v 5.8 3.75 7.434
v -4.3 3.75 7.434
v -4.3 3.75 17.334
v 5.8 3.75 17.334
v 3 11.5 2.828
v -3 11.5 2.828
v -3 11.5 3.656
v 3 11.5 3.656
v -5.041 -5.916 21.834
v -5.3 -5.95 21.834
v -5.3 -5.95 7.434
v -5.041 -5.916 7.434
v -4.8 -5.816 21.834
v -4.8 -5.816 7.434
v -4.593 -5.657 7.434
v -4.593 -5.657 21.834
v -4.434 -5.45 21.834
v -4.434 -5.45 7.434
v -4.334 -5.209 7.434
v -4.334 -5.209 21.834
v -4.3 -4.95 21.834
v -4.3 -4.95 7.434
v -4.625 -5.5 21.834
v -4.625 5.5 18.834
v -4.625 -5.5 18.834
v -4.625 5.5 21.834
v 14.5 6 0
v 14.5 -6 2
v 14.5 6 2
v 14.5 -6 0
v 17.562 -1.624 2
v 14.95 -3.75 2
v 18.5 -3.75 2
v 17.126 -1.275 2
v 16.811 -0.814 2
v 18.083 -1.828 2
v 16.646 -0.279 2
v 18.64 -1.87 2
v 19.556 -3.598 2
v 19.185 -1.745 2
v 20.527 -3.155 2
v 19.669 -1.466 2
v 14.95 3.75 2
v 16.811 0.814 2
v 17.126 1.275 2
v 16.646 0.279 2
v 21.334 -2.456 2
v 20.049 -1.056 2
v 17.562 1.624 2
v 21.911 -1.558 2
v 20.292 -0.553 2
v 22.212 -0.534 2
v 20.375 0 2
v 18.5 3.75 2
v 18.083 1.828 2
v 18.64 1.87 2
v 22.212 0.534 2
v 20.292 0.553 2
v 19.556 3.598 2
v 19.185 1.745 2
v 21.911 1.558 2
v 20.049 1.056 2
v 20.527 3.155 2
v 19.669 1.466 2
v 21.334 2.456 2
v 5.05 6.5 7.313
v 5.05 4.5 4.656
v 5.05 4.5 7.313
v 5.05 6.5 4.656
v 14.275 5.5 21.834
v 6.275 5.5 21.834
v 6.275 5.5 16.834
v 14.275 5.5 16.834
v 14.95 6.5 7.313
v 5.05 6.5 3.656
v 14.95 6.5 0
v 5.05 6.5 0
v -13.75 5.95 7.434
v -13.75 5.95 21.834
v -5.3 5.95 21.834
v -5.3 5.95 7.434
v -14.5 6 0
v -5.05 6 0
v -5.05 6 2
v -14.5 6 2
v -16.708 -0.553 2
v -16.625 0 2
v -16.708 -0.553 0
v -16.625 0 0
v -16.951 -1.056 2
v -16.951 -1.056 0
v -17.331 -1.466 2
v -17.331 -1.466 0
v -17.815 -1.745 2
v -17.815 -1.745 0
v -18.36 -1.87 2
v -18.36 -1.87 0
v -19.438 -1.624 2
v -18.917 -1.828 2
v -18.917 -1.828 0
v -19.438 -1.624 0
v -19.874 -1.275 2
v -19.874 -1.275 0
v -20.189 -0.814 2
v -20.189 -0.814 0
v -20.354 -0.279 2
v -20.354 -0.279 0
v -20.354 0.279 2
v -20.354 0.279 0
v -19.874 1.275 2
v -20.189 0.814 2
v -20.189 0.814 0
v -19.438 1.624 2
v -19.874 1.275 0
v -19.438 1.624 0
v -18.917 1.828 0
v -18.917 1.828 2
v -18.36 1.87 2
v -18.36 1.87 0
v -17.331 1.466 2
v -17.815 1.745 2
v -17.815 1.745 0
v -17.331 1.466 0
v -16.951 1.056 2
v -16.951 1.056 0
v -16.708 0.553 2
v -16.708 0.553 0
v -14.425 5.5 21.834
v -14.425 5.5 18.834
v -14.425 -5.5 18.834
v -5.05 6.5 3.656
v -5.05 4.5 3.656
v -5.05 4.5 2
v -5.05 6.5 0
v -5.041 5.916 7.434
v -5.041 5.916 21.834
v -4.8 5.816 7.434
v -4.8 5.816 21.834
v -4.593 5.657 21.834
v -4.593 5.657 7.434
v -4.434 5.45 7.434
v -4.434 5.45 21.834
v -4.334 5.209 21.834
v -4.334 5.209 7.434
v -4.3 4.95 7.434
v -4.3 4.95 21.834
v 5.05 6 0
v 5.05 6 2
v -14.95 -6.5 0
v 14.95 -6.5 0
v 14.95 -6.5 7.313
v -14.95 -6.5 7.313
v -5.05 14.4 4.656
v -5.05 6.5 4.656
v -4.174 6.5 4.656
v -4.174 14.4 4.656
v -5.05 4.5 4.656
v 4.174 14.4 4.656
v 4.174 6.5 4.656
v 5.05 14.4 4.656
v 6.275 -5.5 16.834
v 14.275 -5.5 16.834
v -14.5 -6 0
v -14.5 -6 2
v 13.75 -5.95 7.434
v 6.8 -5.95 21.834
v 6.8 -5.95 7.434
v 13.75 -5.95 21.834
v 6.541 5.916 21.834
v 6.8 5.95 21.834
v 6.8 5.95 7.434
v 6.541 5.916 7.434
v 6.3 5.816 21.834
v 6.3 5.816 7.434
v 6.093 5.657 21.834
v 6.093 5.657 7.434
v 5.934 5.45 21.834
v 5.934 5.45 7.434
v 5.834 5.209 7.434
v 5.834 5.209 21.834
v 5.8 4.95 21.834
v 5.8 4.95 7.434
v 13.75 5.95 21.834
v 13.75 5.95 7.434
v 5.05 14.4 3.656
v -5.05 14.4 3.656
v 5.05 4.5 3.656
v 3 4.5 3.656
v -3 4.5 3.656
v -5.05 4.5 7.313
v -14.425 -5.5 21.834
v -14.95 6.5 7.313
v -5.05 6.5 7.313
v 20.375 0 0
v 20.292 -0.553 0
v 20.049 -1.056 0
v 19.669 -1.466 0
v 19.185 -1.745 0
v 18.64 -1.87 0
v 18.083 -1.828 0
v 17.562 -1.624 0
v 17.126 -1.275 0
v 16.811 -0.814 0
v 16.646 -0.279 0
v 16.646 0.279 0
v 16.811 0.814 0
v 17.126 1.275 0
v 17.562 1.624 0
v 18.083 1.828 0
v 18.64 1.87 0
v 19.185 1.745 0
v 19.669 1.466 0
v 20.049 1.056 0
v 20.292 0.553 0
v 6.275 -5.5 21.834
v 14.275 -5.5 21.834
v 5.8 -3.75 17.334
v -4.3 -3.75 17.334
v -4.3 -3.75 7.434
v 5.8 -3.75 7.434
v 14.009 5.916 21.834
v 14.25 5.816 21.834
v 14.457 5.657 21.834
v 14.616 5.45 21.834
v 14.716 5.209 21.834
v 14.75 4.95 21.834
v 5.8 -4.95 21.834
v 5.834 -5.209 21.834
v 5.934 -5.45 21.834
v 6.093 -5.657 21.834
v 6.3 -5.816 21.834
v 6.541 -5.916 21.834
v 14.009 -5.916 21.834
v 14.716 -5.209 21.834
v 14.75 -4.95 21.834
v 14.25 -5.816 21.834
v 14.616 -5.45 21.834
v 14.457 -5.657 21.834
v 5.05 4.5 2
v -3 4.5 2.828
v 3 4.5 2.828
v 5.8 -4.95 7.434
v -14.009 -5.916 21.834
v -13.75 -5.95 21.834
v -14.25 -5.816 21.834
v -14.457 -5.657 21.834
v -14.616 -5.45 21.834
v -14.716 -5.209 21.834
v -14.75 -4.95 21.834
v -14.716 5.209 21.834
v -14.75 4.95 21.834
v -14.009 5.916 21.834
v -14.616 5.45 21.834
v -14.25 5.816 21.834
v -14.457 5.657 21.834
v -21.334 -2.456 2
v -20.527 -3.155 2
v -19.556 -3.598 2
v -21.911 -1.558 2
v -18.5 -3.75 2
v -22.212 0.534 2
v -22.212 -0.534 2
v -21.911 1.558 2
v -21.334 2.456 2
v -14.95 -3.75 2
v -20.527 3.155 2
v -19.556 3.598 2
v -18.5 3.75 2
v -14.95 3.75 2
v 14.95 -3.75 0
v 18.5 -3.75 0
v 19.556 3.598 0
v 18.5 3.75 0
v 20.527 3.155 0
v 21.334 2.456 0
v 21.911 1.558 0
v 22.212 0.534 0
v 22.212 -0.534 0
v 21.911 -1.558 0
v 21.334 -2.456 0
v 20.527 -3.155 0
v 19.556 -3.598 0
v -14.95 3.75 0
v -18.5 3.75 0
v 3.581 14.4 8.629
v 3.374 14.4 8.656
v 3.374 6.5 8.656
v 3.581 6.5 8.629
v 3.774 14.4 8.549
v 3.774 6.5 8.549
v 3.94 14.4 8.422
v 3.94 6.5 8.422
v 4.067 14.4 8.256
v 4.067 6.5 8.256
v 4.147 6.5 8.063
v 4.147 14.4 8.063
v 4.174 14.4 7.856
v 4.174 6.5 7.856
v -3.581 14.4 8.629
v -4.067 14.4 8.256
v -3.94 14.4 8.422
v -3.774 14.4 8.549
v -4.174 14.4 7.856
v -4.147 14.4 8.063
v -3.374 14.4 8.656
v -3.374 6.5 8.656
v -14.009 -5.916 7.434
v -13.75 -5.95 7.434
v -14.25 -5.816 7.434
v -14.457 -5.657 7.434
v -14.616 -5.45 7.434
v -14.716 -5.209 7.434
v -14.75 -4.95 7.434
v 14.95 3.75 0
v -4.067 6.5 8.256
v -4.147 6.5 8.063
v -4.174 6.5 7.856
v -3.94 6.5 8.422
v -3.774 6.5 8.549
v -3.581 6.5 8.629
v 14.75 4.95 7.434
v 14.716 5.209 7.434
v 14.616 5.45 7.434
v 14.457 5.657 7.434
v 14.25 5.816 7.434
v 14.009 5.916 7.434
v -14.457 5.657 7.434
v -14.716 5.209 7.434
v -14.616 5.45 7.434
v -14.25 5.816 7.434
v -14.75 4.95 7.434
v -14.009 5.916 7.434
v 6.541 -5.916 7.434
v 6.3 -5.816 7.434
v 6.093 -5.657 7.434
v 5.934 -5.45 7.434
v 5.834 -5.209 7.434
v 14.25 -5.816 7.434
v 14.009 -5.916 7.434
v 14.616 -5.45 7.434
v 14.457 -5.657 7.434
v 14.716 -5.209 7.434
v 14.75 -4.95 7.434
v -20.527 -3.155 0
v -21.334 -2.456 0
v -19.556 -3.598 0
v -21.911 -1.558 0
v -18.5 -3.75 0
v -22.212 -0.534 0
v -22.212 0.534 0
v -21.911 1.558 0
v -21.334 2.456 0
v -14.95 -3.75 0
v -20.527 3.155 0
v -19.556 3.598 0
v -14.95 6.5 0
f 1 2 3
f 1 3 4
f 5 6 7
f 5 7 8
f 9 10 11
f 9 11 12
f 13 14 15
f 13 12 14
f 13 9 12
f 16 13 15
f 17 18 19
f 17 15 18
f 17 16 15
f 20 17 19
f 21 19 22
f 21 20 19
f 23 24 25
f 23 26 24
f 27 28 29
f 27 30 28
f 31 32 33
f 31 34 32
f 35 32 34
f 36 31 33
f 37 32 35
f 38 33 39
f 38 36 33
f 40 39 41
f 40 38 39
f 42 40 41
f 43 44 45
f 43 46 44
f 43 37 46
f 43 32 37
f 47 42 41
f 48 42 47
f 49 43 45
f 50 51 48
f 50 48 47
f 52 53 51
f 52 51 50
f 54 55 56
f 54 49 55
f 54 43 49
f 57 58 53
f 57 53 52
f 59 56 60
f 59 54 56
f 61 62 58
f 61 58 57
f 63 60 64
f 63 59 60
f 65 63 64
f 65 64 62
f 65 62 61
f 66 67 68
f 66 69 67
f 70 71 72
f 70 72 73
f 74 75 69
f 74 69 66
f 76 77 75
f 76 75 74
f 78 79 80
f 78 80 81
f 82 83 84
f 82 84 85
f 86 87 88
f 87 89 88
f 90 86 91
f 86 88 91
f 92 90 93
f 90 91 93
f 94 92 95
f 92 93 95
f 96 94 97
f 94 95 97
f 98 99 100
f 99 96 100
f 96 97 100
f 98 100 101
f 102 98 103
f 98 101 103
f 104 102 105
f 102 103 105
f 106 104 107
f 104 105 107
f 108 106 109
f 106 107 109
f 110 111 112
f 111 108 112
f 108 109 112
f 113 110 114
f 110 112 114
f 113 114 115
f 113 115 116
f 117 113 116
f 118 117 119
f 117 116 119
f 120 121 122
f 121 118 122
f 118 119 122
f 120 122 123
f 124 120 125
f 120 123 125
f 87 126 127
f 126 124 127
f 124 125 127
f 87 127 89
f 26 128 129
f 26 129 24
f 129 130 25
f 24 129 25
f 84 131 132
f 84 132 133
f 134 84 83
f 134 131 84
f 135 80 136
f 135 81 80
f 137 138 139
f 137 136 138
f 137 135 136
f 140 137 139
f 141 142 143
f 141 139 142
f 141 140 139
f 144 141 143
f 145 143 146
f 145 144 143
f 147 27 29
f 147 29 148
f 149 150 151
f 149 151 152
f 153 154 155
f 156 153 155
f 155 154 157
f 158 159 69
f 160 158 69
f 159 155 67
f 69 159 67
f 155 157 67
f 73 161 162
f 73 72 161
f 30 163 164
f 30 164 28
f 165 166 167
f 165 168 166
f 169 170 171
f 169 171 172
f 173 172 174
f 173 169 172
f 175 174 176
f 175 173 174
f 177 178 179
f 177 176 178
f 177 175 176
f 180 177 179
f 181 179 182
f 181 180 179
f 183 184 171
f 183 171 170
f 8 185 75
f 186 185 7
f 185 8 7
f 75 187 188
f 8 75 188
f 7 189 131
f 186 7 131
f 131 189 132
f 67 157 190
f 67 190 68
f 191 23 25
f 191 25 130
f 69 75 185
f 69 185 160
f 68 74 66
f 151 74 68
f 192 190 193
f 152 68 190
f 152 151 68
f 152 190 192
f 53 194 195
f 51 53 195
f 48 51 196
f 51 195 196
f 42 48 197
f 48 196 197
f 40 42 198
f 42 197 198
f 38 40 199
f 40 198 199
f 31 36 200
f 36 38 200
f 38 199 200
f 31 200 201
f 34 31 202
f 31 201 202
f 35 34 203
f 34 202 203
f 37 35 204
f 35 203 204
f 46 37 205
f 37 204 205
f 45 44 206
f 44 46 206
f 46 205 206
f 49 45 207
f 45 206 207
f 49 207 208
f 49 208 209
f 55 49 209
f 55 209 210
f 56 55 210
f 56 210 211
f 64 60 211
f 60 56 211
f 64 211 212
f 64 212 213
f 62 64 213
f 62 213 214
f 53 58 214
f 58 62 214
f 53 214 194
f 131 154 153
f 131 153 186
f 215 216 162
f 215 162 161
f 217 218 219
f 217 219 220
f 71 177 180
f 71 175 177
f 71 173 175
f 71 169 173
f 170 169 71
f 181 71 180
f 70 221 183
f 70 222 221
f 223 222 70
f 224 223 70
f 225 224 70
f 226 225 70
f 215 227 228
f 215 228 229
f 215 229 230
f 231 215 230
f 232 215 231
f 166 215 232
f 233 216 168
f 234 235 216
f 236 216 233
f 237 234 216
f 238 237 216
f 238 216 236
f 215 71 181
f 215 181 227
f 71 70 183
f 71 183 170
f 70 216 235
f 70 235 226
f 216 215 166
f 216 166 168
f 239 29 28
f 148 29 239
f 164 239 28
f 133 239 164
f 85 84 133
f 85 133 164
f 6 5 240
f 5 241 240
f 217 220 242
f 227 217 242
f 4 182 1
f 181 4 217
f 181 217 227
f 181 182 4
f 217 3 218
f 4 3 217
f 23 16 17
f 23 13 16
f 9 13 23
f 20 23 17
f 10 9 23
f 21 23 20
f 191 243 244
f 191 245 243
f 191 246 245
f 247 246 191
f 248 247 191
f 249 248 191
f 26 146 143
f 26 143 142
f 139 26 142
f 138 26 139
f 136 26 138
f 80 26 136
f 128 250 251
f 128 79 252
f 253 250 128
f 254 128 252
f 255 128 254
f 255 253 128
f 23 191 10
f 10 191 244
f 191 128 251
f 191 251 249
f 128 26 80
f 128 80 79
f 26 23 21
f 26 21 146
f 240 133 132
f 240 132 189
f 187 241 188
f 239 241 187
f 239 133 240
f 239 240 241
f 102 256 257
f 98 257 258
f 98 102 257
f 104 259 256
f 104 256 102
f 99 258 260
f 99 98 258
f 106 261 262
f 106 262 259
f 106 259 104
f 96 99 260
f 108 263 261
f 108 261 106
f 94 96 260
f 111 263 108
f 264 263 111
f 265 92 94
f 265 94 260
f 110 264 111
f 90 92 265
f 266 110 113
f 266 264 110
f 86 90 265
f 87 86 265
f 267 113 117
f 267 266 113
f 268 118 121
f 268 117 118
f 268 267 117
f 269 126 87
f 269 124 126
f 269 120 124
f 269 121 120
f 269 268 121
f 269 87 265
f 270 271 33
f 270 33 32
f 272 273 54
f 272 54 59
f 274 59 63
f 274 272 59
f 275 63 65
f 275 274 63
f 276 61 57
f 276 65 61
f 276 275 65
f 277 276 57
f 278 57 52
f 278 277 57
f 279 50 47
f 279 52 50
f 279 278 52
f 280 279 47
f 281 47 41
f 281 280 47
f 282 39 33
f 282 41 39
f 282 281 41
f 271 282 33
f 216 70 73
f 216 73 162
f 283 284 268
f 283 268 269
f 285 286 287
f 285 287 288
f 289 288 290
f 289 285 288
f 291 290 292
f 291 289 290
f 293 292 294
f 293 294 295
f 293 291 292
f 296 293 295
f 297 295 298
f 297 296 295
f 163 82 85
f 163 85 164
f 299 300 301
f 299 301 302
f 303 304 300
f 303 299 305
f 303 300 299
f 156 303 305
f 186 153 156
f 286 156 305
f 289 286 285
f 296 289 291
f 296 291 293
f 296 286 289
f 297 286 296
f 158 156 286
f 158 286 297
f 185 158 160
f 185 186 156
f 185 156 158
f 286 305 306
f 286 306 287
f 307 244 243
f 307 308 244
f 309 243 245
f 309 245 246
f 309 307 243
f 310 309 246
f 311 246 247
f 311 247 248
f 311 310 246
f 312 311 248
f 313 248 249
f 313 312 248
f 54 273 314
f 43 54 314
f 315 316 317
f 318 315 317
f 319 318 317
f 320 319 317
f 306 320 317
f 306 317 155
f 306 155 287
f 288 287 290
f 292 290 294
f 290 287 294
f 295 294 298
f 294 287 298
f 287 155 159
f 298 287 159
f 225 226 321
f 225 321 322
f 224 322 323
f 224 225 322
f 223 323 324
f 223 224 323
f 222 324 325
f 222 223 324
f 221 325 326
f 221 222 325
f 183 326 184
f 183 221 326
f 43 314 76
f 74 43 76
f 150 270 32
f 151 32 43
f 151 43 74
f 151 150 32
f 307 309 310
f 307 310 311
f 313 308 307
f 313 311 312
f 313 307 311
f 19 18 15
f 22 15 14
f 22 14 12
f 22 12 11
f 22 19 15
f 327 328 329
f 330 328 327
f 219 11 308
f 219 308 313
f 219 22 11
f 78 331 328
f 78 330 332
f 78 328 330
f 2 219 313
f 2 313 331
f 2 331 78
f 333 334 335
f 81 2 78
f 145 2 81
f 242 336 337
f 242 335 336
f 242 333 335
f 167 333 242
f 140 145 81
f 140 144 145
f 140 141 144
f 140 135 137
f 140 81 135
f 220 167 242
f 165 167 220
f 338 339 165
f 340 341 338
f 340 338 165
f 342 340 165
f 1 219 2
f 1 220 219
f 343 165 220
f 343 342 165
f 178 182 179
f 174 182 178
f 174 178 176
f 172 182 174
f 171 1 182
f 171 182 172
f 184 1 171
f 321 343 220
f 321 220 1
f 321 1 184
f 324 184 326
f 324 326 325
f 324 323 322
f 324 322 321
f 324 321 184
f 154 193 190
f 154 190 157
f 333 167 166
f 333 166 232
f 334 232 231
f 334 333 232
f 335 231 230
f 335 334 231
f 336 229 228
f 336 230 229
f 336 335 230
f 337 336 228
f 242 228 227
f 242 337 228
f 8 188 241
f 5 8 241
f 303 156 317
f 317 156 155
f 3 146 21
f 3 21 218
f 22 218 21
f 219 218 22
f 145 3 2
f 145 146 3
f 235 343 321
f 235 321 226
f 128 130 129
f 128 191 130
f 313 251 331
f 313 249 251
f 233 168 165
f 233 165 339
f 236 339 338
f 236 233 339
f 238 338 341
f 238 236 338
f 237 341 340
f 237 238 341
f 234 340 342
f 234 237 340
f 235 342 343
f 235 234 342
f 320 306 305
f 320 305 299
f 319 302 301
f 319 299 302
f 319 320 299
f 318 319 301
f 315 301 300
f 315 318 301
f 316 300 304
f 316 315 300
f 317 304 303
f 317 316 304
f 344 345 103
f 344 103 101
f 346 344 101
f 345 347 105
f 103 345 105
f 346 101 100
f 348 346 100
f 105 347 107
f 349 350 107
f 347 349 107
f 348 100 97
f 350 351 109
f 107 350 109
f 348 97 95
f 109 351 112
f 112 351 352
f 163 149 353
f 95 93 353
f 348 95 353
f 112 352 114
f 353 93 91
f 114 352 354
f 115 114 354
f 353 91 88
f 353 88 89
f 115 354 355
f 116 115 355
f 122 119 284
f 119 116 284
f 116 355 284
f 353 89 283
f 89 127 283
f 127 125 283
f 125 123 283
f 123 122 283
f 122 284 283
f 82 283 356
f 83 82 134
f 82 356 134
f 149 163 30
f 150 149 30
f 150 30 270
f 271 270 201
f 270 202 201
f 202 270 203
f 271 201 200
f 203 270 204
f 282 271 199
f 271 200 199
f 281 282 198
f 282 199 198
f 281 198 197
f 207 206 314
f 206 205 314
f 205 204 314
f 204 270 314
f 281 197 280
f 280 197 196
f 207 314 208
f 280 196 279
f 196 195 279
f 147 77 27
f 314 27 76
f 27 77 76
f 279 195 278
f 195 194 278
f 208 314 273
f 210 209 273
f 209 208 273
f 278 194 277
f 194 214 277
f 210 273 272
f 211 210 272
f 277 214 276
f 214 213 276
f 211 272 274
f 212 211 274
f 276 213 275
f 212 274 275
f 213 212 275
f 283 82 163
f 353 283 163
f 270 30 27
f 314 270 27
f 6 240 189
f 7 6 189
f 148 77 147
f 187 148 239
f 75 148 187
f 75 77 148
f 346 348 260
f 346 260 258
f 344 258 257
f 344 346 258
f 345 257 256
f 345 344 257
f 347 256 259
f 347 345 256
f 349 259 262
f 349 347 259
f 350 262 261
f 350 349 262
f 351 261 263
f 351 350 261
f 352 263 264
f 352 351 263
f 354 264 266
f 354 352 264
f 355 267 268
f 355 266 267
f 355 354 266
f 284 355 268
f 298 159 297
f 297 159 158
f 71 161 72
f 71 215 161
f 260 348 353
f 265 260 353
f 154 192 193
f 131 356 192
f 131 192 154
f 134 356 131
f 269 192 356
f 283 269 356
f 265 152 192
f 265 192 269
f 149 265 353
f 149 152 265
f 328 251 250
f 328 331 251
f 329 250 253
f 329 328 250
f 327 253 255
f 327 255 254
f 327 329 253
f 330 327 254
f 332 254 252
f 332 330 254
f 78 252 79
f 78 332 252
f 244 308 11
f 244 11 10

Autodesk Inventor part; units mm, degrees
ref_plane "YZ Plane" through (0, 0, 0) normal (1, 0, 0) x (0, 1, 0)
ref_plane "XZ Plane" through (0, 0, 0) normal (0, 1, 0) x (-1, 0, 0)
ref_plane "XY Plane" through (0, 0, 0) normal (0, 0, 1) x (1, 0, 0)
sketch "Sketch1" plane through (0, 0, 0) normal (0, 0, 1) x (1, 0, 0)
  point P0 (0, 0)
sketch "Sketch2" plane through (0, 0, 0) normal (0, 0, 1) x (1, 0, 0)
  line L0 (-18.5, -6.5) -> (18.5, 6.5) construction
  line L1 (18.5, -6.5) -> (-18.5, 6.5) construction
  line L2 (-37.4614, 31.3521) -> (71.8103, 31.3521) construction
  line L3 (71.8103, 31.3521) -> (71.8103, -55.6726) construction
  line L4 (71.8103, -55.6726) -> (-37.4614, -55.6726) construction
  line L5 (-37.4614, -55.6726) -> (-37.4614, 31.3521) construction
  circle A0 centre (-18.5, 0) radius 1.875
  circle A1 centre (18.5, 0) radius 1.875
  line L6 (-14.75, 6.5) -> (14.75, 6.5)
  line L7 (14.75, 6.5) -> (14.75, -6.5)
  line L8 (14.75, -6.5) -> (-14.75, -6.5)
  line L9 (-14.75, -6.5) -> (-14.75, 6.5)
  line L10 (-14.75, 6.5) -> (14.75, -6.5) construction
  line L11 (14.75, 6.5) -> (-14.75, -6.5) construction
  circle A2 centre (-18.5, 0) radius 3.75
  circle A3 centre (18.5, 0) radius 3.75
  line L12 (-18.5, 3.75) -> (-14.75, 3.75)
  line L13 (-18.5, -3.75) -> (-14.75, -3.75)
  line L14 (18.5, 3.75) -> (14.75, 3.75)
  line L15 (18.5, -3.75) -> (14.75, -3.75)
  line L16 (-14.75, 3.75) -> (-14.75, 6.5)
  line L17 (-14.75, -3.75) -> (-14.75, -6.5)
  line L18 (14.75, 6.5) -> (14.75, 3.75)
  line L19 (14.75, -3.75) -> (14.75, -6.5)
  point P0 (0, 0)
  dimension "d0" = 37
  dimension "d1" = 13
  dimension "d30" = 3.75
  dimension "d31" = 3.75
  dimension "d32" = 29.5
extrude "Extrusion1" add sketch "Sketch2" along normal blind 2
sketch "Sketch3" plane through (0, 0, 0) normal (0, 1, 0) x (-1, 0, 0)
  line L0 (-37.7031, 80.2938) -> (71.7944, 80.2938) construction
  line L1 (71.7944, 80.2938) -> (71.7944, -6.9107) construction
  line L2 (71.7944, -6.9107) -> (-37.7031, -6.9107) construction
  line L3 (-37.7031, -6.9107) -> (-37.7031, 80.2938) construction
  line L4 (0, 0) -> (14.95, 0)
  line L5 (14.95, 0) -> (-14.95, 0)
  line L6 (-14.95, 0) -> (-14.95, 7.3126)
  line L7 (-14.95, 7.3126) -> (14.95, 7.3126)
  line L8 (14.95, 7.3126) -> (14.95, 0)
  dimension "d46" = 14.95
  dimension "d48" = 29.9
extrude "Extrusion2" add sketch "Sketch3" along normal mid plane 13
sketch "Sketch4" plane through (0, 0, 0) normal (0, 1, 0) x (-1, 0, 0)
  line L0 (-37.6511, 80.3124) -> (71.7381, 80.3124) construction
  line L1 (71.7381, 80.3124) -> (71.7381, -6.8059) construction
  line L2 (71.7381, -6.8059) -> (-37.6511, -6.8059) construction
  line L3 (-37.6511, -6.8059) -> (-37.6511, 80.3124) construction
  line L4 (0, 7.4343) -> (14.75, 7.4343)
  line L5 (14.75, 7.4343) -> (-14.75, 7.4343)
  line L6 (-14.75, 7.4343) -> (-14.75, 21.8343)
  line L7 (-14.75, 21.8343) -> (14.75, 21.8343)
  line L8 (14.75, 21.8343) -> (14.75, 7.4343)
  point P0 (0, 0)
  dimension "d78" = 14.75
  dimension "d79" = 29.5
  dimension "d80" = 14.4
extrude "Extrusion3" add sketch "Sketch4" along normal mid plane 11.9
sketch "Sketch6" plane through (-14.75, 5.95, 21.8343) normal (0, 0, 1) x (1, 0, 0)
  line L0 (0, 0) -> (29.5, 0) projected
  line L1 (20.5637, -11.9) -> (8.9363, -11.9)
  line L2 (8.9363, -11.9) -> (8.9363, 0)
  line L3 (8.9363, 0) -> (20.5637, 0)
  line L4 (20.5637, 0) -> (20.5637, -11.9)
  line L5 (20.5637, -11.9) -> (8.9363, 0) construction
  line L6 (8.9363, -11.9) -> (20.5637, 0) construction
  point P0 (14.75, -5.95)
extrude "Extrusion4" cut sketch "Sketch6" against normal blind 4.5
sketch "Sketch7" plane through (0, 5.95, 0) normal (0, 1, 0) x (1, 0, 0)
  line L0 (14.75, -7.4343) -> (-14.75, -7.4343) projected
  line L1 (-5.8137, -17.3343) -> (5.8137, -17.3343)
  line L2 (5.8137, -17.3343) -> (5.8137, -7.4343)
  line L3 (5.8137, -7.4343) -> (-5.8137, -7.4343)
  line L4 (-5.8137, -7.4343) -> (-5.8137, -17.3343)
  point P0 (0, 0)
extrude "Extrusion5" cut sketch "Sketch7" against normal blind 2.2
sketch "Sketch8" plane through (0, -5.95, 0) normal (0, -1, 0) x (1, 0, 0)
  line L0 (-14.75, 7.4343) -> (14.75, 7.4343) projected
  line L1 (-5.8137, 17.3343) -> (5.8137, 17.3343)
  line L2 (5.8137, 17.3343) -> (5.8137, 7.4343)
  line L3 (5.8137, 7.4343) -> (-5.8137, 7.4343)
  line L4 (-5.8137, 7.4343) -> (-5.8137, 17.3343)
  point P0 (0, 0)
extrude "Extrusion6" cut sketch "Sketch8" against normal blind 2.2
sketch "Sketch9" plane through (-5.8137, -5.95, 21.8343) normal (1, 0, 0) x (0, 0, -1)
  line L0 (0, 0) -> (0, 11.9) projected
  line L1 (14.4, 0) -> (0, 0) projected
  line L2 (14.4, 2.2) -> (14.4, 0) projected
  line L3 (14.4, 2.2) -> (4.5, 2.2) projected
  line L4 (4.5, 2.2) -> (4.5, 9.7) projected
  line L5 (4.5, 9.7) -> (14.4, 9.7) projected
  line L6 (14.4, 11.9) -> (14.4, 9.7) projected
  line L7 (0, 11.9) -> (14.4, 11.9) projected
  point P0 (21.8343, 5.95)
extrude "Extrusion7" add sketch "Sketch9" along normal blind 1.514
sketch "Sketch10" plane through (5.8137, -5.95, 21.8343) normal (-1, 0, 0) x (0, 0, 1)
  line L0 (0, 11.9) -> (0, 0) projected
  line L1 (-14.4, 11.9) -> (0, 11.9) projected
  line L2 (-14.4, 9.7) -> (-14.4, 11.9) projected
  line L3 (-14.4, 9.7) -> (-4.5, 9.7) projected
  line L4 (-4.5, 9.7) -> (-4.5, 2.2) projected
  line L5 (-4.5, 2.2) -> (-14.4, 2.2) projected
  line L6 (-14.4, 0) -> (-14.4, 2.2) projected
  line L7 (0, 0) -> (-14.4, 0) projected
  point P0 (-21.8343, 5.95)
extrude "Extrusion8" add sketch "Sketch10" along normal blind 0.014
sketch "Sketch11" plane through (-14.75, -5.95, 21.8343) normal (0, 0, 1) x (1, 0, 0)
  line L0 (0, 11.9) -> (10.4503, 11.9) projected
  line L1 (0.3252, 11.45) -> (10.1252, 11.45)
  line L2 (10.1252, 11.45) -> (10.1252, 0.45)
  line L3 (10.1252, 0.45) -> (0.3252, 0.45)
  line L4 (0.3252, 0.45) -> (0.3252, 11.45)
  line L5 (0.3252, 11.45) -> (10.1252, 0.45) construction
  line L6 (10.1252, 11.45) -> (0.3252, 0.45) construction
  point P0 (14.75, 5.95)
  point P1 (5.2252, 5.95)
  dimension "d134" = 9.8
  dimension "d135" = 11
extrude "Extrusion9" cut sketch "Sketch11" against normal blind 3
sketch "Sketch12" plane through (14.75, -5.95, 21.8343) normal (0, 0, 1) x (1, 0, 0)
  line L0 (0, 0) -> (-8.9503, 0) projected
  line L1 (-8.4752, 11.45) -> (-0.4752, 11.45)
  line L2 (-0.4752, 11.45) -> (-0.4752, 0.45)
  line L3 (-0.4752, 0.45) -> (-8.4752, 0.45)
  line L4 (-8.4752, 0.45) -> (-8.4752, 11.45)
  line L5 (-8.4752, 11.45) -> (-0.4752, 0.45) construction
  line L6 (-0.4752, 11.45) -> (-8.4752, 0.45) construction
  point P0 (-14.75, 5.95)
  point P1 (-4.4752, 5.95)
  dimension "d138" = 8
  dimension "d139" = 11
extrude "Extrusion10" cut sketch "Sketch12" against normal blind 5
sketch "Sketch13" plane through (-14.95, 6.5, 0) normal (0, 1, 0) x (1, 0, 0)
  line L0 (29.9, 0) -> (0, 0) projected
  line L1 (0, -7.3126) -> (29.9, -7.3126) projected
  line L2 (14.95, 0) -> (9.9, 0)
  line L3 (9.9, 0) -> (20, 0)
  line L4 (20, 0) -> (20, -7.3126)
  line L5 (20, -7.3126) -> (9.9, -7.3126)
  line L6 (9.9, -7.3126) -> (9.9, 0)
  line L7 (20, 0) -> (9.9, 0)
  line L8 (9.9, 0) -> (9.9, -1)
  line L9 (9.9, -1) -> (20, -1)
  line L10 (20, -1) -> (20, 0)
  dimension "d142" = 5.05
  dimension "d143" = 10.1
  dimension "d144" = 1
extrude "Extrusion11" cut sketch "Sketch13" against normal blind 2
sketch "Sketch14" plane through (-14.95, 4.5, 0) normal (0, 1, 0) x (1, 0, 0)
  line L0 (9.9, -7.3126) -> (9.9, 0) projected
  line L1 (20, -7.3126) -> (9.9, -7.3126) projected
  line L2 (20, 0) -> (20, -7.3126) projected
  line L3 (9.9, 0) -> (20, 0) projected
  point P0 (14.95, 0)
sketch "Sketch15" plane through (-14.95, 4.5, 0) normal (0, 1, 0) x (1, 0, 0)
  line L0 (9.9, -7.3126) -> (9.9, 0) projected
  line L1 (20, 0) -> (20, -7.3126) projected
  line L2 (20, -3.6563) -> (9.9, -3.6563)
  line L3 (9.9, -3.6563) -> (9.9, -4.6563)
  line L4 (9.9, -4.6563) -> (20, -4.6563)
  line L5 (20, -4.6563) -> (20, -3.6563)
  point P0 (14.95, 0)
  dimension "d147" = 1
extrude "Extrusion12" add sketch "Sketch15" along normal blind 9.9
sketch "Sketch16" plane through (0, 0, 0) normal (0, 0, -1) x (-1, 0, 0)
  line L0 (-14.95, 6.5) -> (-5.05, 6.5) projected
  line L1 (-14.5, 6) -> (14.5, 6)
  line L2 (14.5, 6) -> (14.5, -6)
  line L3 (14.5, -6) -> (-14.5, -6)
  line L4 (-14.5, -6) -> (-14.5, 6)
  line L5 (-14.5, 6) -> (14.5, -6) construction
  line L6 (14.5, 6) -> (-14.5, -6) construction
  point P0 (0, 0)
  dimension "d150" = 29
  dimension "d151" = 12
extrude "Extrusion13" cut sketch "Sketch16" against normal blind 2
sketch "Sketch17" plane through (-5.05, 4.5, 4.6563) normal (0, 0, 1) x (1, 0, 0)
  line L0 (10.1, 0) -> (0, 0) projected
  line L1 (0.876, 2) -> (9.224, 2)
  line L2 (9.224, 2) -> (9.224, 9.9)
  line L3 (9.224, 9.9) -> (0.876, 9.9)
  line L4 (0.876, 9.9) -> (0.876, 2)
  line L5 (0.876, 2) -> (9.224, 9.9) construction
  line L6 (9.224, 2) -> (0.876, 9.9) construction
  point P0 (5.05, -4.5)
  point P1 (5.05, 5.95)
extrude "Extrusion14" add sketch "Sketch17" along normal blind 4
sketch "Sketch18" plane through (-14.95, 4.5, 0) normal (0, 1, 0) x (1, 0, 0)
  line L0 (20, -2) -> (9.9, -2) projected
  line L1 (9.9, -3.6563) -> (9.9, -2) projected
  line L2 (9.9, -3.6563) -> (20, -3.6563) projected
  line L3 (20, -2) -> (20, -3.6563) projected
  point P0 (14.95, 0)
sketch "Sketch19" plane through (-14.95, 4.5, 0) normal (0, 1, 0) x (1, 0, 0)
  line L0 (9.9, -3.6563) -> (20, -3.6563) projected
  line L1 (11.95, -4.4845) -> (17.95, -4.4845)
  line L2 (17.95, -4.4845) -> (17.95, -2.8282)
  line L3 (17.95, -2.8282) -> (11.95, -2.8282)
  line L4 (11.95, -2.8282) -> (11.95, -4.4845)
  line L5 (11.95, -4.4845) -> (17.95, -2.8282) construction
  line L6 (17.95, -4.4845) -> (11.95, -2.8282) construction
  point P0 (14.95, 0)
  point P1 (14.95, -3.6563)
  dimension "d156" = 6
extrude "Extrusion15" add sketch "Sketch19" along normal blind 7
fillet "Fillet1" radius 0.8 2 edges at (4.174, 10.45, 8.6563) (-4.174, 10.45, 8.6563)
fillet "Fillet2" radius 1 8 edges at (14.75, 5.95, 14.6343) (14.75, -5.95, 14.6343) (-14.75, 5.95, 14.6343) (-4.2997, 5.95, 14.6343) (5.7997, 5.95, 14.6343) (5.7997, -5.95, 14.6343) (-4.2997, -5.95, 14.6343) (-14.75, -5.95, 14.6343)
properties part number "SharpDistanceRanger"
